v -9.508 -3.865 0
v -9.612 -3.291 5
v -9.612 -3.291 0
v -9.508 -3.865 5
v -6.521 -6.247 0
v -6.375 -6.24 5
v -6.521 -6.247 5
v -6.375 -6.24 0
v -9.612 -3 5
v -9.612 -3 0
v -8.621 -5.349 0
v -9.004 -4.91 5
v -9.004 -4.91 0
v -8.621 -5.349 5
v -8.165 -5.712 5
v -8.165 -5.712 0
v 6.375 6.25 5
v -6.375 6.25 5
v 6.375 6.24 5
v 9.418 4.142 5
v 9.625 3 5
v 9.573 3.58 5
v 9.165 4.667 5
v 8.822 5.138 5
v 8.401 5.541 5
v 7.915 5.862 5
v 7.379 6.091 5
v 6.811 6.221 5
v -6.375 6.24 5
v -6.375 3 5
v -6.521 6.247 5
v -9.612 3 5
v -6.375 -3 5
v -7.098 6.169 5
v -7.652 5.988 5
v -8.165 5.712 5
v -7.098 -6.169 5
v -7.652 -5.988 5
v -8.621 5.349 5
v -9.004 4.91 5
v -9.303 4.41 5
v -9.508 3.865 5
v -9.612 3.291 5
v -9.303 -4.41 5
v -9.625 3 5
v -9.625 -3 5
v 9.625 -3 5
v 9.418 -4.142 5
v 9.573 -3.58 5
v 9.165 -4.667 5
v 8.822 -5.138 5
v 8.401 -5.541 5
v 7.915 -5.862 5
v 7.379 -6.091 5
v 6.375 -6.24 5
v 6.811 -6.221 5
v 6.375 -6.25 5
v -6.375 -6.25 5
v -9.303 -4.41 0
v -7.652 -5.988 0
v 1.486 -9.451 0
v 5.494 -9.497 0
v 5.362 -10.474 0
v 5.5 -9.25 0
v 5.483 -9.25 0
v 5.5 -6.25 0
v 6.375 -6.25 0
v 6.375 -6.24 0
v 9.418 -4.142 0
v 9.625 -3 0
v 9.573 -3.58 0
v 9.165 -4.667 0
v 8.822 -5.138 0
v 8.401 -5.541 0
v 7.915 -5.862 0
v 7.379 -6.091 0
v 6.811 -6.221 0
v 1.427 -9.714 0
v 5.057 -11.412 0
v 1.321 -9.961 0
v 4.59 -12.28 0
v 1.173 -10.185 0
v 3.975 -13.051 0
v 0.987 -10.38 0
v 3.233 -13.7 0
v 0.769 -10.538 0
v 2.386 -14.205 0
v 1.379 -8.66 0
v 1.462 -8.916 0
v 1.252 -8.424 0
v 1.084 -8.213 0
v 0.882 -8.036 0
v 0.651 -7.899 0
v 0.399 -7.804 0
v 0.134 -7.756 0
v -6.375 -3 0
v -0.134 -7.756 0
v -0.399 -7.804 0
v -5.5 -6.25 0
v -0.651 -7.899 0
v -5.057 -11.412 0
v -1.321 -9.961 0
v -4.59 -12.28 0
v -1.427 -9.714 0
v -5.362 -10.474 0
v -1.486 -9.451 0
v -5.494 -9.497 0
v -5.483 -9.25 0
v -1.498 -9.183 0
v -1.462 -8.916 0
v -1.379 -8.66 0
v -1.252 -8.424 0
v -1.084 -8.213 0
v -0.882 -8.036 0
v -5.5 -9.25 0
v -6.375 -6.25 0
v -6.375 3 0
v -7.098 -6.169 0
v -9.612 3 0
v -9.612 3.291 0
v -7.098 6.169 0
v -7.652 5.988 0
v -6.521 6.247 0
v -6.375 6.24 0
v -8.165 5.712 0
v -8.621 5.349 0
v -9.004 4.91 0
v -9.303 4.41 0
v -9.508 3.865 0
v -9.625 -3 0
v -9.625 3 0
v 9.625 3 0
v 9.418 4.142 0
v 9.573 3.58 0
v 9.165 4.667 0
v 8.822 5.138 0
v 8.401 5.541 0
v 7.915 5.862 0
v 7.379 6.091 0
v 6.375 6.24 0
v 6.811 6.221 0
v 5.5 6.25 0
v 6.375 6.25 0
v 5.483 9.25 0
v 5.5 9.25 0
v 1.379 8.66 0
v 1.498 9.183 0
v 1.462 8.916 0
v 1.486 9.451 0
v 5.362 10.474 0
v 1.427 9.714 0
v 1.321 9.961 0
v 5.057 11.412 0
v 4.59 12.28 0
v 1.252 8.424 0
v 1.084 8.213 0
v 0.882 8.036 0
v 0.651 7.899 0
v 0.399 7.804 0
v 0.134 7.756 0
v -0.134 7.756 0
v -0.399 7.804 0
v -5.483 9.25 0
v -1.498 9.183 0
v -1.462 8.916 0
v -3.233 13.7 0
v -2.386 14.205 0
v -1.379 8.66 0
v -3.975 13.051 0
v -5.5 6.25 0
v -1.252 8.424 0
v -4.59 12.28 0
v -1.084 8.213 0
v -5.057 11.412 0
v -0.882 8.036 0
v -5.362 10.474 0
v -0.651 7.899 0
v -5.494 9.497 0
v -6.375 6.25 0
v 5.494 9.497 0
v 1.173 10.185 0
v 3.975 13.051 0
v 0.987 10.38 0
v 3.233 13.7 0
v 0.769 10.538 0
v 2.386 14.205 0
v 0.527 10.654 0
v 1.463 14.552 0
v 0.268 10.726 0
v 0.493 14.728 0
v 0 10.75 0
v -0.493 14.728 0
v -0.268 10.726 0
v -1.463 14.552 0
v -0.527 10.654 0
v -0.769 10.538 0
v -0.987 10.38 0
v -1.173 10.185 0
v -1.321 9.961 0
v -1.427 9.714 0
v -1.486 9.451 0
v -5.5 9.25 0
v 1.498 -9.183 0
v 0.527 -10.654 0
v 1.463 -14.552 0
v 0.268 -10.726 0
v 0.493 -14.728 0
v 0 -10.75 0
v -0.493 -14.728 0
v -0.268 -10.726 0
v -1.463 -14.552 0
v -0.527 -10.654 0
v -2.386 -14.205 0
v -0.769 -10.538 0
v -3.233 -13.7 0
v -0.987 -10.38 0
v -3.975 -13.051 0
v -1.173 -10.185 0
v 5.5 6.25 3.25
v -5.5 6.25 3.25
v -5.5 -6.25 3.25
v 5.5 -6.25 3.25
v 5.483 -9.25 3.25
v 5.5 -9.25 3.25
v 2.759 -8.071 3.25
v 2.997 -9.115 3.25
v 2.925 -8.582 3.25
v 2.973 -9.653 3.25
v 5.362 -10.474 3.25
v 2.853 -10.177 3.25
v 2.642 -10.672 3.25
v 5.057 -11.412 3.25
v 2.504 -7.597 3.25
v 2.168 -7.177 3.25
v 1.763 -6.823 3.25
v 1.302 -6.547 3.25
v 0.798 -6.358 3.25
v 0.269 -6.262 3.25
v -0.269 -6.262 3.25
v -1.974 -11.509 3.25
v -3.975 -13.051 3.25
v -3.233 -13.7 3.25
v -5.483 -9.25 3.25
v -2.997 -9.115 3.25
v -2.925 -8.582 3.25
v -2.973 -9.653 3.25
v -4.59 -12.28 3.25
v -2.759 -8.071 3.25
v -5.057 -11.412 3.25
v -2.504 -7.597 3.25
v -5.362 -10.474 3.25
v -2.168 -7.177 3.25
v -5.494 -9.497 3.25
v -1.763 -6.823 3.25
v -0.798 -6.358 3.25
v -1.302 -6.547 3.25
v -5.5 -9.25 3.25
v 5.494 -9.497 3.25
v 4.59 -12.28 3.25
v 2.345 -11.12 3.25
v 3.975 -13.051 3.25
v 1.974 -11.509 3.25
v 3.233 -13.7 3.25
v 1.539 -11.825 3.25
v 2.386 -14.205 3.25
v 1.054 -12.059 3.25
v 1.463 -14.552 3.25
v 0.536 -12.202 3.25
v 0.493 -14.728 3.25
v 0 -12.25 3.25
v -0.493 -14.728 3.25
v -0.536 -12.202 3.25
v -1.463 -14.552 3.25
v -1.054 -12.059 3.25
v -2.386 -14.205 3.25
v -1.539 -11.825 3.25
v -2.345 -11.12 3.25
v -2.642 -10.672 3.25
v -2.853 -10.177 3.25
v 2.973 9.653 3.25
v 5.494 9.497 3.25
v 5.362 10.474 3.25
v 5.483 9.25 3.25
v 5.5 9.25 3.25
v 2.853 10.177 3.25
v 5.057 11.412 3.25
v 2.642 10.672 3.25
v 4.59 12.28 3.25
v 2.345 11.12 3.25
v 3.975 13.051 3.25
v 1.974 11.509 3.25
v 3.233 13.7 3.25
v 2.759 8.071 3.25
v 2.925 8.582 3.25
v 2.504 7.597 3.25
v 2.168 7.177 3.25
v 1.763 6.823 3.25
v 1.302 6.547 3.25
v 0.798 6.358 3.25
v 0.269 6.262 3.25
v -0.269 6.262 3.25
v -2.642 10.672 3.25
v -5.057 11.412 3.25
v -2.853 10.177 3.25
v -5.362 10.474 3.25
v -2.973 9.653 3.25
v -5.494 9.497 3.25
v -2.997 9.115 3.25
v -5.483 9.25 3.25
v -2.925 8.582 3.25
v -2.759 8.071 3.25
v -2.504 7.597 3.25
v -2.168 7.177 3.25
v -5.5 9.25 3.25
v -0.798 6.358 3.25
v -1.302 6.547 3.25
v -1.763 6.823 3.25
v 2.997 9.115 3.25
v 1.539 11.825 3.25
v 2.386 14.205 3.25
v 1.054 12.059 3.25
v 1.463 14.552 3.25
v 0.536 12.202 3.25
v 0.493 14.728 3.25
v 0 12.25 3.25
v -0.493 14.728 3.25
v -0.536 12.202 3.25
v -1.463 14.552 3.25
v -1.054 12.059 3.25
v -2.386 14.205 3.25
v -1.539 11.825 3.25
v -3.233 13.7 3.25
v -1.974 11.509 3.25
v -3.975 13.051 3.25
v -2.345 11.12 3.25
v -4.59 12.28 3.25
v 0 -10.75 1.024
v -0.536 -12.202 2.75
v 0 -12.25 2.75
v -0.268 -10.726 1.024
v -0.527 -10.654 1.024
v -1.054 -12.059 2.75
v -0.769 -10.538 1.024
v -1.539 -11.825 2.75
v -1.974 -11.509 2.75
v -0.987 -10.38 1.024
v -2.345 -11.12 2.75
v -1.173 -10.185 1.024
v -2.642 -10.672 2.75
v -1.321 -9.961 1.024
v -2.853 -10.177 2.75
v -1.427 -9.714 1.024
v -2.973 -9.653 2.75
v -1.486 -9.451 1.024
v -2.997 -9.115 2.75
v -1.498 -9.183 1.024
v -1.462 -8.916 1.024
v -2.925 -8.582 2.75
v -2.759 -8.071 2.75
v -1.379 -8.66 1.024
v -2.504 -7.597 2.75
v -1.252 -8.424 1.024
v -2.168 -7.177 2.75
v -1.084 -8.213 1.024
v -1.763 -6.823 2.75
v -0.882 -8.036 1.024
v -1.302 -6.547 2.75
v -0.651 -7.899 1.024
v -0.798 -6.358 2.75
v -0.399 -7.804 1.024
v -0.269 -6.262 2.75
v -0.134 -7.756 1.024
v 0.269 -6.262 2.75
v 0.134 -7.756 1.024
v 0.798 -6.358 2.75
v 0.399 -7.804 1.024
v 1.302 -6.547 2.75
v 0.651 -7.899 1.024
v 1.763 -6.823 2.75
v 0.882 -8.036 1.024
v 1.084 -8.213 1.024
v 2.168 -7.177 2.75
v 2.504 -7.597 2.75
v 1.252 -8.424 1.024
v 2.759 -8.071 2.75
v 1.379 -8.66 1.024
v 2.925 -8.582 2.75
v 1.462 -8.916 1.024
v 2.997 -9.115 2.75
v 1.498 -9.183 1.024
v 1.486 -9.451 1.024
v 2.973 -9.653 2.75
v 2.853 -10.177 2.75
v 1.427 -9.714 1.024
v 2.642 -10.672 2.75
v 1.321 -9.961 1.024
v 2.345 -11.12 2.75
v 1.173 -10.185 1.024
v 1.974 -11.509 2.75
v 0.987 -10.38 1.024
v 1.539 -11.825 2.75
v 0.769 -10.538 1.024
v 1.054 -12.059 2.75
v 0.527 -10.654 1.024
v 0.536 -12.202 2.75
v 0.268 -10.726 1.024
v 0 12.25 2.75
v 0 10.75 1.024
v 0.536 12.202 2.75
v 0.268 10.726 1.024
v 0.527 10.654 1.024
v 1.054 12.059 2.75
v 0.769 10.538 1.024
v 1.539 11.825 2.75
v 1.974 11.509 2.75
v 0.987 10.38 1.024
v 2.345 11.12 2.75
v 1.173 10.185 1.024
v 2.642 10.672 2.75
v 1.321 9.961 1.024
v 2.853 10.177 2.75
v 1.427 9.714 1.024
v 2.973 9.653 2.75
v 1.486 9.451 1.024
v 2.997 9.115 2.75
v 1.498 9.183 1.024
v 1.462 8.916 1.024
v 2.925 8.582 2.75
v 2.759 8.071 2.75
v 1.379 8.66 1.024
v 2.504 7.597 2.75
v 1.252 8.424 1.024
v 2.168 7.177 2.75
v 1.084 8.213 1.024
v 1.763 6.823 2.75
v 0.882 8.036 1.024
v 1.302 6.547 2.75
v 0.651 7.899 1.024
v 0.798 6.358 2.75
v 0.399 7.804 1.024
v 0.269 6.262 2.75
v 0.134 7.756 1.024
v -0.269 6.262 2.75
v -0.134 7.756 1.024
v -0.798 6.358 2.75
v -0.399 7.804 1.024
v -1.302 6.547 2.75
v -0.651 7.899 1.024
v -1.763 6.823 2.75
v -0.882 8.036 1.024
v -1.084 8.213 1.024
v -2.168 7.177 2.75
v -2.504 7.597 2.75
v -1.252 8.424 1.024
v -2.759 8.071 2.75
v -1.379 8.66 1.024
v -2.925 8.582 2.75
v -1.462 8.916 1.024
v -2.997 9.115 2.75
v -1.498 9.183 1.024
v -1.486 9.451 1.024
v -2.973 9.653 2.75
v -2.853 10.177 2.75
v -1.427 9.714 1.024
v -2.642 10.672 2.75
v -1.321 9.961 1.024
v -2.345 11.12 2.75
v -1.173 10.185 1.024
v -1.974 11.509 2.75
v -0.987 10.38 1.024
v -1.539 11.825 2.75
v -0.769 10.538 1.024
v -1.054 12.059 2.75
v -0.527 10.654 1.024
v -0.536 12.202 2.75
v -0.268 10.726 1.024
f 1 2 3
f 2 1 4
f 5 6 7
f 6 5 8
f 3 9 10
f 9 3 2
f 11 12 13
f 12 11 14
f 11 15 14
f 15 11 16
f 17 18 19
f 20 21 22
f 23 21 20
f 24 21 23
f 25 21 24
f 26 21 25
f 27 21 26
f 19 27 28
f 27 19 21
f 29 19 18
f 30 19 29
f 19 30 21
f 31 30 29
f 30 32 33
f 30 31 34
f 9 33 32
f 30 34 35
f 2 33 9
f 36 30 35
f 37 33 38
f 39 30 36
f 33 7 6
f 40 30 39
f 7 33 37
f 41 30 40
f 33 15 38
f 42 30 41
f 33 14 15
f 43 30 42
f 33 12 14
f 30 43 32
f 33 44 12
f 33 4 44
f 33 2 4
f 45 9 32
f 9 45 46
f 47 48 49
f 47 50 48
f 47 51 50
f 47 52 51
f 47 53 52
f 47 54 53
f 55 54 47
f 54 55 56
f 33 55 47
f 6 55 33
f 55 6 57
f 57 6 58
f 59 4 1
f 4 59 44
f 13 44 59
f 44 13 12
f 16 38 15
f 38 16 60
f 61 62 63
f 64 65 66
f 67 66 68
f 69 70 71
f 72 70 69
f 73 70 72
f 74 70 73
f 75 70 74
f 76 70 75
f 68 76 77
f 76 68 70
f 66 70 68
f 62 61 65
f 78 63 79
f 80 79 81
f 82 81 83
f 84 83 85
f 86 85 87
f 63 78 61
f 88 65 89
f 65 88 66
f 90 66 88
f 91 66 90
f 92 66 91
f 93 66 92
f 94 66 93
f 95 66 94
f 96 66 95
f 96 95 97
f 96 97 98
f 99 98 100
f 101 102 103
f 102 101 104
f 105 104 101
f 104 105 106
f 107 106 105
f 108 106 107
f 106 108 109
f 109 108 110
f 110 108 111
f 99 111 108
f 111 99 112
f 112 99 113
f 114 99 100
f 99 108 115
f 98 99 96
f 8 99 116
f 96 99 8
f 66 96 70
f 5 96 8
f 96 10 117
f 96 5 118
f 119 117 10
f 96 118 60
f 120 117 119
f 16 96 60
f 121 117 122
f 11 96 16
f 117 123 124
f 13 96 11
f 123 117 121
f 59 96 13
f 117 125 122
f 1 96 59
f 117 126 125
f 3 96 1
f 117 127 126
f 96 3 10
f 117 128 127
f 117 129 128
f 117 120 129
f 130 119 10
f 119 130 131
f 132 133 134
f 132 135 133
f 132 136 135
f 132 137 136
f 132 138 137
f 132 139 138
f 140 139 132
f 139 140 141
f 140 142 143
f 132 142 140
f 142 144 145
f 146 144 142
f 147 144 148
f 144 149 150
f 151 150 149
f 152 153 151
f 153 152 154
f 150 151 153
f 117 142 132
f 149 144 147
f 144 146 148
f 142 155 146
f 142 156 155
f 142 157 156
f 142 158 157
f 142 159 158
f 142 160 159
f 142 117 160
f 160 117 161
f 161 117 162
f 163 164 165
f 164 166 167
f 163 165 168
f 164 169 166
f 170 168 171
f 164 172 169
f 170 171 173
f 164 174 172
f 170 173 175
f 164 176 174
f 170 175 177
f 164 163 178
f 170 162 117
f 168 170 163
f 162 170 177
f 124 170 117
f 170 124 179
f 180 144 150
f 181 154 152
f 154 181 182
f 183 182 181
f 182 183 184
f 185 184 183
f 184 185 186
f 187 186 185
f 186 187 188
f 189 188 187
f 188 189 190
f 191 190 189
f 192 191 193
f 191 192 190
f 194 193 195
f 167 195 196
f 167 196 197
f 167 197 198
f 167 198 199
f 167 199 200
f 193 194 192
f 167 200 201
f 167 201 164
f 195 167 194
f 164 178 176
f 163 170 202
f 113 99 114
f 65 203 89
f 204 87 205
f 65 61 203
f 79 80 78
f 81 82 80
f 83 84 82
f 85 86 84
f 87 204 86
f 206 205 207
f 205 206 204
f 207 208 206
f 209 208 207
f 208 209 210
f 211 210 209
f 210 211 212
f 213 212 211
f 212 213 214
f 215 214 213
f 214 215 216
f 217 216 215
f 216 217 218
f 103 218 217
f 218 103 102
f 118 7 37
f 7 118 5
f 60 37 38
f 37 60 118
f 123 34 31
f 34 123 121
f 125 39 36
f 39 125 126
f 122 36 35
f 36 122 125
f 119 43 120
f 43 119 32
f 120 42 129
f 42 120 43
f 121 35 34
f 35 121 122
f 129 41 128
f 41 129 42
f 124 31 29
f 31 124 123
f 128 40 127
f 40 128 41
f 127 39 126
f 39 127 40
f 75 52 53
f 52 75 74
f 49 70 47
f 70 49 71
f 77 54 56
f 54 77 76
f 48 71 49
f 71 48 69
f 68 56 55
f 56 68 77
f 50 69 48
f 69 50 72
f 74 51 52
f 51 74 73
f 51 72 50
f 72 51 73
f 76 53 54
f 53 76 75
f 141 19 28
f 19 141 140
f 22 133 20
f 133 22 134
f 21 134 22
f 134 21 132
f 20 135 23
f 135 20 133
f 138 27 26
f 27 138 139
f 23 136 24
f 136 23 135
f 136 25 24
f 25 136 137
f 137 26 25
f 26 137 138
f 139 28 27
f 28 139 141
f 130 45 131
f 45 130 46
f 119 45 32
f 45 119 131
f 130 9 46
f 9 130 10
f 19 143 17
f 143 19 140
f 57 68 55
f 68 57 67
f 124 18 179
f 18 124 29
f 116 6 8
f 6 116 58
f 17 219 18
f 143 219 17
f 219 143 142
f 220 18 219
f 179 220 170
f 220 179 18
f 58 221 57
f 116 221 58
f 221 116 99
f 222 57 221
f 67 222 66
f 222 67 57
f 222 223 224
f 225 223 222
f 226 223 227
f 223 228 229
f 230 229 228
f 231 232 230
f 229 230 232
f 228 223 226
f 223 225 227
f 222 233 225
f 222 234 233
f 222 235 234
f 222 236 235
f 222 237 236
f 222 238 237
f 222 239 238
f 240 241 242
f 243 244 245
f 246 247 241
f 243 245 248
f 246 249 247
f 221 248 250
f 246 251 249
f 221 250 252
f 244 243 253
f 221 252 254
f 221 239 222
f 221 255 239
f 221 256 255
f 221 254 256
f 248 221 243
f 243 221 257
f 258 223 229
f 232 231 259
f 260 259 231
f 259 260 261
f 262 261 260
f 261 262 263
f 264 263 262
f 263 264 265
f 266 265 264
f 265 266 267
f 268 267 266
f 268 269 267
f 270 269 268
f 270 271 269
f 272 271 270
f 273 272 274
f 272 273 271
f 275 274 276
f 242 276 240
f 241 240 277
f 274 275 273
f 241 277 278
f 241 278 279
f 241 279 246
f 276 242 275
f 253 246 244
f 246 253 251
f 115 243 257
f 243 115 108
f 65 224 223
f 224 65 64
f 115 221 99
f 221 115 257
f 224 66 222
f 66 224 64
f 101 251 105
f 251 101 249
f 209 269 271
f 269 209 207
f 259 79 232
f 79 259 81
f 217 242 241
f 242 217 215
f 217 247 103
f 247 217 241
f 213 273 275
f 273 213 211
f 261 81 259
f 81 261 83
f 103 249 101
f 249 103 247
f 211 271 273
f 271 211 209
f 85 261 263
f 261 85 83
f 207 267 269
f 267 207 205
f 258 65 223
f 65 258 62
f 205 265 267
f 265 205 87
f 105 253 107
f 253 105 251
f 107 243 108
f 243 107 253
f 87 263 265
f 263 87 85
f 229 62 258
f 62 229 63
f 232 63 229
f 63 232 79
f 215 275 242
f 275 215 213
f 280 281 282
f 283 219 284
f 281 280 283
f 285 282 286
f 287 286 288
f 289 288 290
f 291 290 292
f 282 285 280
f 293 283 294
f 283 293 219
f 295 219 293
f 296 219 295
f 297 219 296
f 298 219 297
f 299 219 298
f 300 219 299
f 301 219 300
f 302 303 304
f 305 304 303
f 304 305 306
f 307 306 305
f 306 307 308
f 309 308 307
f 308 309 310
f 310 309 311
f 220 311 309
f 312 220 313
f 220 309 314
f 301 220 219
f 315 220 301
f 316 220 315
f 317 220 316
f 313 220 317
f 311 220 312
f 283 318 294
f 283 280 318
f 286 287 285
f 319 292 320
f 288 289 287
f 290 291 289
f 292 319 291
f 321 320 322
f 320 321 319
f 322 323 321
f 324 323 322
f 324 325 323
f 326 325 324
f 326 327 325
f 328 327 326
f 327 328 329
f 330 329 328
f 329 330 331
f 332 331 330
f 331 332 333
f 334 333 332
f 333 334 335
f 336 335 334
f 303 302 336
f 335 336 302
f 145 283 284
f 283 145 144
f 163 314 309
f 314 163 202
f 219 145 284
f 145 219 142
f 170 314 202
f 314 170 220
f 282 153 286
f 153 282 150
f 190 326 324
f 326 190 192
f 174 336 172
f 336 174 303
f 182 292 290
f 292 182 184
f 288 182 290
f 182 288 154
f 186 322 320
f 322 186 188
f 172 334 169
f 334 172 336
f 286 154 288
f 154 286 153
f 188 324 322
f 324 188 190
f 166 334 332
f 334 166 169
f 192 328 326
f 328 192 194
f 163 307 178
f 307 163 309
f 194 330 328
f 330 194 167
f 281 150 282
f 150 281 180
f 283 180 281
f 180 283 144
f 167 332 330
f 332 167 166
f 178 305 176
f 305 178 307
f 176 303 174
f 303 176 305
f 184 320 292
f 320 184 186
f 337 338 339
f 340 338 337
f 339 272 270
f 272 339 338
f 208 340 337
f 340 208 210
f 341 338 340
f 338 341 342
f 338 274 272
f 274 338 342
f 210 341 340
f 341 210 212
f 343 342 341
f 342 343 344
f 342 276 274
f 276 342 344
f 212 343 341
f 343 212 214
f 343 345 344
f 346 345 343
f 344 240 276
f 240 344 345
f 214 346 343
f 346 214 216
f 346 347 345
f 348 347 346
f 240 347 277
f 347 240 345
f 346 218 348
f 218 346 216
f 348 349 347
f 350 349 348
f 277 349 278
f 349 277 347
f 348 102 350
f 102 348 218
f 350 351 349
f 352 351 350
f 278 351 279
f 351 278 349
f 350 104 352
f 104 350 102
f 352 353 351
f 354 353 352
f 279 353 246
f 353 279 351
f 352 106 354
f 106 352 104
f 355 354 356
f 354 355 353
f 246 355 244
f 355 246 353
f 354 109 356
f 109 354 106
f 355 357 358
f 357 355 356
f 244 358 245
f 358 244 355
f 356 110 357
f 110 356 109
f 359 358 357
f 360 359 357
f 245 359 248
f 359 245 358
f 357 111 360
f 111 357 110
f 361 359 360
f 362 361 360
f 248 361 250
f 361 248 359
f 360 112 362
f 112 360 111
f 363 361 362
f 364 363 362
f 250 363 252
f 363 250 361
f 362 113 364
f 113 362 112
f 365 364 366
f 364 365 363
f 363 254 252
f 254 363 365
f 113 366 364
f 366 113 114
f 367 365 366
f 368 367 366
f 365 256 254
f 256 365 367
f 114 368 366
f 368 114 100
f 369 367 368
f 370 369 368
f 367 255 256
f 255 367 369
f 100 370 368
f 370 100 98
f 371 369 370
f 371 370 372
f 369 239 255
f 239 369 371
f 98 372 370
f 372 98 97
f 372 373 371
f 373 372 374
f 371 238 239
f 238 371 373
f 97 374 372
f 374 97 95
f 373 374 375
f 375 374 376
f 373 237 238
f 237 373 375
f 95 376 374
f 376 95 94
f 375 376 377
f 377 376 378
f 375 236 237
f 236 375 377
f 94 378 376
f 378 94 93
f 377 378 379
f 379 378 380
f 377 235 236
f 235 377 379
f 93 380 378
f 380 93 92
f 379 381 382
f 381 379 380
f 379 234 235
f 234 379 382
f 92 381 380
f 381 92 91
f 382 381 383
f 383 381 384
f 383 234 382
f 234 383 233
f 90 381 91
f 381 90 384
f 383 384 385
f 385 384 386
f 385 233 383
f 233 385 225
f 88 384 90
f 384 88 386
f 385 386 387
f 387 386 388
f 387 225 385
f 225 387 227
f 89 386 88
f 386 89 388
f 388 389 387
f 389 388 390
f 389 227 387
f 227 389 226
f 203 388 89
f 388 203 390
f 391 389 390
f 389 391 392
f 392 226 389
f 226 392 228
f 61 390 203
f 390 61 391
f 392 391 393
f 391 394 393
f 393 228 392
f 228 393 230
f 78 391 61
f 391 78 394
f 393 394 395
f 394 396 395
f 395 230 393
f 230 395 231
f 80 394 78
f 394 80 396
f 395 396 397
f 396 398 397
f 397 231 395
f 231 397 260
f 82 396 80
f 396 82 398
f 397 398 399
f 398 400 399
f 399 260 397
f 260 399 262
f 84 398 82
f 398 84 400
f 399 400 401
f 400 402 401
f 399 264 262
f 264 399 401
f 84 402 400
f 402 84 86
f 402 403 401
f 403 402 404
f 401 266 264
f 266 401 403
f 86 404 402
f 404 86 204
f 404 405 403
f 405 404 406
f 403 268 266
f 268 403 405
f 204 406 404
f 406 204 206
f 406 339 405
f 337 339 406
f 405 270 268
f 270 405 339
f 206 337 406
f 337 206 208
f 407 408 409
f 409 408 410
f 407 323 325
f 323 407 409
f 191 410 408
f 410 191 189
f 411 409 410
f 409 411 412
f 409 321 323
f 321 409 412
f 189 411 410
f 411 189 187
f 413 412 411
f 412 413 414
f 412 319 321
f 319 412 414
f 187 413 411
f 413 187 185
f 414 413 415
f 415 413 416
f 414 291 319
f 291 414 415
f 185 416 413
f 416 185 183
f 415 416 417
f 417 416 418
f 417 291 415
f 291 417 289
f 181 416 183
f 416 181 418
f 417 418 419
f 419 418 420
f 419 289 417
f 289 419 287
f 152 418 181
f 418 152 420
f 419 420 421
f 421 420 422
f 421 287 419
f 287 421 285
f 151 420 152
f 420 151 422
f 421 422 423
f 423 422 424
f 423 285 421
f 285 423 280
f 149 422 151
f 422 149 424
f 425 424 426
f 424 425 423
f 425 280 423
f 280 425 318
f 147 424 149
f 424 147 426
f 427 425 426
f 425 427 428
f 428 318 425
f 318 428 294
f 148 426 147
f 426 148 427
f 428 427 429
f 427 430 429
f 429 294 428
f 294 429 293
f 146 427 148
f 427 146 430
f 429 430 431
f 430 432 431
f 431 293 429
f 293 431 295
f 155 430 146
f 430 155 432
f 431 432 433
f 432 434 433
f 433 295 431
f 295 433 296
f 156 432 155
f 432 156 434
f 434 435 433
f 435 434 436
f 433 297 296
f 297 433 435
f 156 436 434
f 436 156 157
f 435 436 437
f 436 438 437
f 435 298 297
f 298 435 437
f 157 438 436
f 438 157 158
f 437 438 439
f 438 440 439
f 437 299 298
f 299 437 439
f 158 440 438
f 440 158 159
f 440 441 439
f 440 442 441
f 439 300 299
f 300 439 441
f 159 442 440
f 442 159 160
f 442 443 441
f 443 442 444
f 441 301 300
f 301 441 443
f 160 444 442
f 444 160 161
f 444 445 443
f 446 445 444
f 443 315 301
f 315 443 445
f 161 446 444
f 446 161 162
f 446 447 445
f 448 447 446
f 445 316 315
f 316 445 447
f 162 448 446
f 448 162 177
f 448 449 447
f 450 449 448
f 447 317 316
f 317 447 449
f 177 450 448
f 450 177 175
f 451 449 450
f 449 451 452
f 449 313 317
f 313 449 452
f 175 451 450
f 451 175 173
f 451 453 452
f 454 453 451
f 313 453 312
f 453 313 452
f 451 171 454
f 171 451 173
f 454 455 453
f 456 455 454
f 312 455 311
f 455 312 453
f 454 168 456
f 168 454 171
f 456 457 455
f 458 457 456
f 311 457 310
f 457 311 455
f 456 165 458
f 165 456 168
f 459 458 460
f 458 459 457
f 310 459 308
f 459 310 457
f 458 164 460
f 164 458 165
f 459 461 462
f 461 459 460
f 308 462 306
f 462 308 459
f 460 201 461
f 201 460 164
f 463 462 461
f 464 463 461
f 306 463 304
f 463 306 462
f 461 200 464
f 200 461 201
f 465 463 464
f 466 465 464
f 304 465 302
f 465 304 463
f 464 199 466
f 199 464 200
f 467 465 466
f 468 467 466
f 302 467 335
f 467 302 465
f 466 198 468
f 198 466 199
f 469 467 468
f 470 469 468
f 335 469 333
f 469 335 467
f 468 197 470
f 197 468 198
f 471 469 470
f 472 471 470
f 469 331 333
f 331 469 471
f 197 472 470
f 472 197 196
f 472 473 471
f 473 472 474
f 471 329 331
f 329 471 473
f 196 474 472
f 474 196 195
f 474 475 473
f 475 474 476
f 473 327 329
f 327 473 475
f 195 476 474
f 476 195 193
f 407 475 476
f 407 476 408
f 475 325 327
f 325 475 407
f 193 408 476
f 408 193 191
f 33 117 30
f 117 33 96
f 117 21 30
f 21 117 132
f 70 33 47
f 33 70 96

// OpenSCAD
/*
 * Board Anchor (Parametric), v0.42
 *
 * by Alex Franke (CodeCreations), Dec 2012
 * http://www.theFrankes.com
 * 
 * Licenced under Creative Commons Attribution - Non-Commercial - Share Alike 3.0 
 * 
 * DESCRIPTION: Serves to anchor a board (such as the foot of a laser-cut printer) vertically. 
 * 
 * INSTRUCTIONS:  Print an anchor for each end to be anchored, then install with the board in place
 *   if possible. 
 * 
 * v0.42, Dec 28, 2012: Initial Release.
 * 
 * TODO: 
 *   * None at this time. 
 */


/////////////////////////////////////////////////////////////////////////////
// User-defined values... 
/////////////////////////////////////////////////////////////////////////////

thickness      = 3.25; // Thickness of the printed material 
anchorLength   = 16;   // Length of board edge to "wrap" in the anchor 
anchorHeight   = 5;    // Height of anchor portion  
boardThickness = 6;    // Thickness of the board to anchor

shaftDiameter  = 3;    // The diameter of the through-hole for the screw. #6=3.58, #4=2.78
headDiameter   = 6;    // The diameter of the head of the screw. #6=7.14, #4=5.95
holePadding    = 2.5;  // The width of the material around the hole 
screwAngle     = 82;   // Countersink angle (angle of screw head -- 82 is pretty standard for wood 
                       //   screws.) Other common countersink angles are 60, 90, 100, 110, and 120. 

counterSink    = 0.5;  // Additional distance to inset the countersink

$fn            = 35;   // General curve quality


/////////////////////////////////////////////////////////////////////////////
// The code...
/////////////////////////////////////////////////////////////////////////////

yHeight = (headDiameter/2-shaftDiameter/2)/tan(screwAngle/2); 

difference() {
	union() {
		roundedBox([anchorLength+thickness,boardThickness+thickness*2,anchorHeight],thickness);

		for(y=[-1,1]) 
			translate([0,(boardThickness/2+thickness+headDiameter/2)*y,0]) 
				rotate(y*-90) 
					bracket(headDiameter/2,shaftDiameter/2,headDiameter/2,holePadding,thickness);
	}

	// remove the board 
	translate([-(anchorLength+thickness)/2+thickness,-boardThickness/2,-0.5]) 
		cube([anchorLength+1,boardThickness,anchorHeight+1]);

	// Remove the screw holes 
	for(y=[-1,1]) 
		translate([0,(boardThickness/2+thickness+headDiameter/2)*y,-counterSink]) 
			rotate(y*-90) 
				bracketHole(shaftDiameter/2,headDiameter/2,screwAngle,thickness);
}


/////////////////////////////////////////////////////////////////////////////
// Modules...
/////////////////////////////////////////////////////////////////////////////

module roundedBox(size, radius) {
	union() {
		for(x=[-1,1],y=[-1,1]) 
			translate([x*(size[0]-radius*2)/2,y*(size[1]-radius*2)/2,0]) 
				cylinder(h=size[2],r=radius);

		translate([0,0,size[2]/2]) {
			cube([size[0],size[1]-radius*2,size[2]], center=true);
			cube([size[0]-radius*2, size[1],size[2]], center=true);
		}
	}
}

// length = end to hole center
module bracket(length, holeRadius, headRadius, holePadding, thickness) {
	union() {
		translate([length/2,0,thickness/2]) 	
			cube([length,(headRadius+holePadding)*2,thickness], center=true); 
		cylinder(h=thickness,r=headRadius+holePadding);
	}
}

module bracketHole(holeRadius, headRadius, headAngle, thickness) {
	translate([0,0,thickness]) 
	rotate_extrude(convexity=4) {
		polygon(points=[
			[0,-(thickness+1)-yHeight],
			[holeRadius,-(thickness+1)-yHeight],
			[holeRadius,-yHeight],
			[headRadius,0],
			[headRadius,thickness+1],
			[0,thickness+1]
		]);
	}
}

module wedge(length, height, angle) {

	x = length; 
	y = 2*x*tan(angle/2); 
	z = height;
	x2 = (y/2)/sin(angle/2);

	difference() {
		translate([0,-y/2,0]) 
			cube([x,y,z]);

		for(i=[-1,1])
			rotate([0,0,angle/2*i]) 
				translate([0,-y/2 +y/2*i,-0.5]) 
					cube([x2,y,z+1]);

	}
}
